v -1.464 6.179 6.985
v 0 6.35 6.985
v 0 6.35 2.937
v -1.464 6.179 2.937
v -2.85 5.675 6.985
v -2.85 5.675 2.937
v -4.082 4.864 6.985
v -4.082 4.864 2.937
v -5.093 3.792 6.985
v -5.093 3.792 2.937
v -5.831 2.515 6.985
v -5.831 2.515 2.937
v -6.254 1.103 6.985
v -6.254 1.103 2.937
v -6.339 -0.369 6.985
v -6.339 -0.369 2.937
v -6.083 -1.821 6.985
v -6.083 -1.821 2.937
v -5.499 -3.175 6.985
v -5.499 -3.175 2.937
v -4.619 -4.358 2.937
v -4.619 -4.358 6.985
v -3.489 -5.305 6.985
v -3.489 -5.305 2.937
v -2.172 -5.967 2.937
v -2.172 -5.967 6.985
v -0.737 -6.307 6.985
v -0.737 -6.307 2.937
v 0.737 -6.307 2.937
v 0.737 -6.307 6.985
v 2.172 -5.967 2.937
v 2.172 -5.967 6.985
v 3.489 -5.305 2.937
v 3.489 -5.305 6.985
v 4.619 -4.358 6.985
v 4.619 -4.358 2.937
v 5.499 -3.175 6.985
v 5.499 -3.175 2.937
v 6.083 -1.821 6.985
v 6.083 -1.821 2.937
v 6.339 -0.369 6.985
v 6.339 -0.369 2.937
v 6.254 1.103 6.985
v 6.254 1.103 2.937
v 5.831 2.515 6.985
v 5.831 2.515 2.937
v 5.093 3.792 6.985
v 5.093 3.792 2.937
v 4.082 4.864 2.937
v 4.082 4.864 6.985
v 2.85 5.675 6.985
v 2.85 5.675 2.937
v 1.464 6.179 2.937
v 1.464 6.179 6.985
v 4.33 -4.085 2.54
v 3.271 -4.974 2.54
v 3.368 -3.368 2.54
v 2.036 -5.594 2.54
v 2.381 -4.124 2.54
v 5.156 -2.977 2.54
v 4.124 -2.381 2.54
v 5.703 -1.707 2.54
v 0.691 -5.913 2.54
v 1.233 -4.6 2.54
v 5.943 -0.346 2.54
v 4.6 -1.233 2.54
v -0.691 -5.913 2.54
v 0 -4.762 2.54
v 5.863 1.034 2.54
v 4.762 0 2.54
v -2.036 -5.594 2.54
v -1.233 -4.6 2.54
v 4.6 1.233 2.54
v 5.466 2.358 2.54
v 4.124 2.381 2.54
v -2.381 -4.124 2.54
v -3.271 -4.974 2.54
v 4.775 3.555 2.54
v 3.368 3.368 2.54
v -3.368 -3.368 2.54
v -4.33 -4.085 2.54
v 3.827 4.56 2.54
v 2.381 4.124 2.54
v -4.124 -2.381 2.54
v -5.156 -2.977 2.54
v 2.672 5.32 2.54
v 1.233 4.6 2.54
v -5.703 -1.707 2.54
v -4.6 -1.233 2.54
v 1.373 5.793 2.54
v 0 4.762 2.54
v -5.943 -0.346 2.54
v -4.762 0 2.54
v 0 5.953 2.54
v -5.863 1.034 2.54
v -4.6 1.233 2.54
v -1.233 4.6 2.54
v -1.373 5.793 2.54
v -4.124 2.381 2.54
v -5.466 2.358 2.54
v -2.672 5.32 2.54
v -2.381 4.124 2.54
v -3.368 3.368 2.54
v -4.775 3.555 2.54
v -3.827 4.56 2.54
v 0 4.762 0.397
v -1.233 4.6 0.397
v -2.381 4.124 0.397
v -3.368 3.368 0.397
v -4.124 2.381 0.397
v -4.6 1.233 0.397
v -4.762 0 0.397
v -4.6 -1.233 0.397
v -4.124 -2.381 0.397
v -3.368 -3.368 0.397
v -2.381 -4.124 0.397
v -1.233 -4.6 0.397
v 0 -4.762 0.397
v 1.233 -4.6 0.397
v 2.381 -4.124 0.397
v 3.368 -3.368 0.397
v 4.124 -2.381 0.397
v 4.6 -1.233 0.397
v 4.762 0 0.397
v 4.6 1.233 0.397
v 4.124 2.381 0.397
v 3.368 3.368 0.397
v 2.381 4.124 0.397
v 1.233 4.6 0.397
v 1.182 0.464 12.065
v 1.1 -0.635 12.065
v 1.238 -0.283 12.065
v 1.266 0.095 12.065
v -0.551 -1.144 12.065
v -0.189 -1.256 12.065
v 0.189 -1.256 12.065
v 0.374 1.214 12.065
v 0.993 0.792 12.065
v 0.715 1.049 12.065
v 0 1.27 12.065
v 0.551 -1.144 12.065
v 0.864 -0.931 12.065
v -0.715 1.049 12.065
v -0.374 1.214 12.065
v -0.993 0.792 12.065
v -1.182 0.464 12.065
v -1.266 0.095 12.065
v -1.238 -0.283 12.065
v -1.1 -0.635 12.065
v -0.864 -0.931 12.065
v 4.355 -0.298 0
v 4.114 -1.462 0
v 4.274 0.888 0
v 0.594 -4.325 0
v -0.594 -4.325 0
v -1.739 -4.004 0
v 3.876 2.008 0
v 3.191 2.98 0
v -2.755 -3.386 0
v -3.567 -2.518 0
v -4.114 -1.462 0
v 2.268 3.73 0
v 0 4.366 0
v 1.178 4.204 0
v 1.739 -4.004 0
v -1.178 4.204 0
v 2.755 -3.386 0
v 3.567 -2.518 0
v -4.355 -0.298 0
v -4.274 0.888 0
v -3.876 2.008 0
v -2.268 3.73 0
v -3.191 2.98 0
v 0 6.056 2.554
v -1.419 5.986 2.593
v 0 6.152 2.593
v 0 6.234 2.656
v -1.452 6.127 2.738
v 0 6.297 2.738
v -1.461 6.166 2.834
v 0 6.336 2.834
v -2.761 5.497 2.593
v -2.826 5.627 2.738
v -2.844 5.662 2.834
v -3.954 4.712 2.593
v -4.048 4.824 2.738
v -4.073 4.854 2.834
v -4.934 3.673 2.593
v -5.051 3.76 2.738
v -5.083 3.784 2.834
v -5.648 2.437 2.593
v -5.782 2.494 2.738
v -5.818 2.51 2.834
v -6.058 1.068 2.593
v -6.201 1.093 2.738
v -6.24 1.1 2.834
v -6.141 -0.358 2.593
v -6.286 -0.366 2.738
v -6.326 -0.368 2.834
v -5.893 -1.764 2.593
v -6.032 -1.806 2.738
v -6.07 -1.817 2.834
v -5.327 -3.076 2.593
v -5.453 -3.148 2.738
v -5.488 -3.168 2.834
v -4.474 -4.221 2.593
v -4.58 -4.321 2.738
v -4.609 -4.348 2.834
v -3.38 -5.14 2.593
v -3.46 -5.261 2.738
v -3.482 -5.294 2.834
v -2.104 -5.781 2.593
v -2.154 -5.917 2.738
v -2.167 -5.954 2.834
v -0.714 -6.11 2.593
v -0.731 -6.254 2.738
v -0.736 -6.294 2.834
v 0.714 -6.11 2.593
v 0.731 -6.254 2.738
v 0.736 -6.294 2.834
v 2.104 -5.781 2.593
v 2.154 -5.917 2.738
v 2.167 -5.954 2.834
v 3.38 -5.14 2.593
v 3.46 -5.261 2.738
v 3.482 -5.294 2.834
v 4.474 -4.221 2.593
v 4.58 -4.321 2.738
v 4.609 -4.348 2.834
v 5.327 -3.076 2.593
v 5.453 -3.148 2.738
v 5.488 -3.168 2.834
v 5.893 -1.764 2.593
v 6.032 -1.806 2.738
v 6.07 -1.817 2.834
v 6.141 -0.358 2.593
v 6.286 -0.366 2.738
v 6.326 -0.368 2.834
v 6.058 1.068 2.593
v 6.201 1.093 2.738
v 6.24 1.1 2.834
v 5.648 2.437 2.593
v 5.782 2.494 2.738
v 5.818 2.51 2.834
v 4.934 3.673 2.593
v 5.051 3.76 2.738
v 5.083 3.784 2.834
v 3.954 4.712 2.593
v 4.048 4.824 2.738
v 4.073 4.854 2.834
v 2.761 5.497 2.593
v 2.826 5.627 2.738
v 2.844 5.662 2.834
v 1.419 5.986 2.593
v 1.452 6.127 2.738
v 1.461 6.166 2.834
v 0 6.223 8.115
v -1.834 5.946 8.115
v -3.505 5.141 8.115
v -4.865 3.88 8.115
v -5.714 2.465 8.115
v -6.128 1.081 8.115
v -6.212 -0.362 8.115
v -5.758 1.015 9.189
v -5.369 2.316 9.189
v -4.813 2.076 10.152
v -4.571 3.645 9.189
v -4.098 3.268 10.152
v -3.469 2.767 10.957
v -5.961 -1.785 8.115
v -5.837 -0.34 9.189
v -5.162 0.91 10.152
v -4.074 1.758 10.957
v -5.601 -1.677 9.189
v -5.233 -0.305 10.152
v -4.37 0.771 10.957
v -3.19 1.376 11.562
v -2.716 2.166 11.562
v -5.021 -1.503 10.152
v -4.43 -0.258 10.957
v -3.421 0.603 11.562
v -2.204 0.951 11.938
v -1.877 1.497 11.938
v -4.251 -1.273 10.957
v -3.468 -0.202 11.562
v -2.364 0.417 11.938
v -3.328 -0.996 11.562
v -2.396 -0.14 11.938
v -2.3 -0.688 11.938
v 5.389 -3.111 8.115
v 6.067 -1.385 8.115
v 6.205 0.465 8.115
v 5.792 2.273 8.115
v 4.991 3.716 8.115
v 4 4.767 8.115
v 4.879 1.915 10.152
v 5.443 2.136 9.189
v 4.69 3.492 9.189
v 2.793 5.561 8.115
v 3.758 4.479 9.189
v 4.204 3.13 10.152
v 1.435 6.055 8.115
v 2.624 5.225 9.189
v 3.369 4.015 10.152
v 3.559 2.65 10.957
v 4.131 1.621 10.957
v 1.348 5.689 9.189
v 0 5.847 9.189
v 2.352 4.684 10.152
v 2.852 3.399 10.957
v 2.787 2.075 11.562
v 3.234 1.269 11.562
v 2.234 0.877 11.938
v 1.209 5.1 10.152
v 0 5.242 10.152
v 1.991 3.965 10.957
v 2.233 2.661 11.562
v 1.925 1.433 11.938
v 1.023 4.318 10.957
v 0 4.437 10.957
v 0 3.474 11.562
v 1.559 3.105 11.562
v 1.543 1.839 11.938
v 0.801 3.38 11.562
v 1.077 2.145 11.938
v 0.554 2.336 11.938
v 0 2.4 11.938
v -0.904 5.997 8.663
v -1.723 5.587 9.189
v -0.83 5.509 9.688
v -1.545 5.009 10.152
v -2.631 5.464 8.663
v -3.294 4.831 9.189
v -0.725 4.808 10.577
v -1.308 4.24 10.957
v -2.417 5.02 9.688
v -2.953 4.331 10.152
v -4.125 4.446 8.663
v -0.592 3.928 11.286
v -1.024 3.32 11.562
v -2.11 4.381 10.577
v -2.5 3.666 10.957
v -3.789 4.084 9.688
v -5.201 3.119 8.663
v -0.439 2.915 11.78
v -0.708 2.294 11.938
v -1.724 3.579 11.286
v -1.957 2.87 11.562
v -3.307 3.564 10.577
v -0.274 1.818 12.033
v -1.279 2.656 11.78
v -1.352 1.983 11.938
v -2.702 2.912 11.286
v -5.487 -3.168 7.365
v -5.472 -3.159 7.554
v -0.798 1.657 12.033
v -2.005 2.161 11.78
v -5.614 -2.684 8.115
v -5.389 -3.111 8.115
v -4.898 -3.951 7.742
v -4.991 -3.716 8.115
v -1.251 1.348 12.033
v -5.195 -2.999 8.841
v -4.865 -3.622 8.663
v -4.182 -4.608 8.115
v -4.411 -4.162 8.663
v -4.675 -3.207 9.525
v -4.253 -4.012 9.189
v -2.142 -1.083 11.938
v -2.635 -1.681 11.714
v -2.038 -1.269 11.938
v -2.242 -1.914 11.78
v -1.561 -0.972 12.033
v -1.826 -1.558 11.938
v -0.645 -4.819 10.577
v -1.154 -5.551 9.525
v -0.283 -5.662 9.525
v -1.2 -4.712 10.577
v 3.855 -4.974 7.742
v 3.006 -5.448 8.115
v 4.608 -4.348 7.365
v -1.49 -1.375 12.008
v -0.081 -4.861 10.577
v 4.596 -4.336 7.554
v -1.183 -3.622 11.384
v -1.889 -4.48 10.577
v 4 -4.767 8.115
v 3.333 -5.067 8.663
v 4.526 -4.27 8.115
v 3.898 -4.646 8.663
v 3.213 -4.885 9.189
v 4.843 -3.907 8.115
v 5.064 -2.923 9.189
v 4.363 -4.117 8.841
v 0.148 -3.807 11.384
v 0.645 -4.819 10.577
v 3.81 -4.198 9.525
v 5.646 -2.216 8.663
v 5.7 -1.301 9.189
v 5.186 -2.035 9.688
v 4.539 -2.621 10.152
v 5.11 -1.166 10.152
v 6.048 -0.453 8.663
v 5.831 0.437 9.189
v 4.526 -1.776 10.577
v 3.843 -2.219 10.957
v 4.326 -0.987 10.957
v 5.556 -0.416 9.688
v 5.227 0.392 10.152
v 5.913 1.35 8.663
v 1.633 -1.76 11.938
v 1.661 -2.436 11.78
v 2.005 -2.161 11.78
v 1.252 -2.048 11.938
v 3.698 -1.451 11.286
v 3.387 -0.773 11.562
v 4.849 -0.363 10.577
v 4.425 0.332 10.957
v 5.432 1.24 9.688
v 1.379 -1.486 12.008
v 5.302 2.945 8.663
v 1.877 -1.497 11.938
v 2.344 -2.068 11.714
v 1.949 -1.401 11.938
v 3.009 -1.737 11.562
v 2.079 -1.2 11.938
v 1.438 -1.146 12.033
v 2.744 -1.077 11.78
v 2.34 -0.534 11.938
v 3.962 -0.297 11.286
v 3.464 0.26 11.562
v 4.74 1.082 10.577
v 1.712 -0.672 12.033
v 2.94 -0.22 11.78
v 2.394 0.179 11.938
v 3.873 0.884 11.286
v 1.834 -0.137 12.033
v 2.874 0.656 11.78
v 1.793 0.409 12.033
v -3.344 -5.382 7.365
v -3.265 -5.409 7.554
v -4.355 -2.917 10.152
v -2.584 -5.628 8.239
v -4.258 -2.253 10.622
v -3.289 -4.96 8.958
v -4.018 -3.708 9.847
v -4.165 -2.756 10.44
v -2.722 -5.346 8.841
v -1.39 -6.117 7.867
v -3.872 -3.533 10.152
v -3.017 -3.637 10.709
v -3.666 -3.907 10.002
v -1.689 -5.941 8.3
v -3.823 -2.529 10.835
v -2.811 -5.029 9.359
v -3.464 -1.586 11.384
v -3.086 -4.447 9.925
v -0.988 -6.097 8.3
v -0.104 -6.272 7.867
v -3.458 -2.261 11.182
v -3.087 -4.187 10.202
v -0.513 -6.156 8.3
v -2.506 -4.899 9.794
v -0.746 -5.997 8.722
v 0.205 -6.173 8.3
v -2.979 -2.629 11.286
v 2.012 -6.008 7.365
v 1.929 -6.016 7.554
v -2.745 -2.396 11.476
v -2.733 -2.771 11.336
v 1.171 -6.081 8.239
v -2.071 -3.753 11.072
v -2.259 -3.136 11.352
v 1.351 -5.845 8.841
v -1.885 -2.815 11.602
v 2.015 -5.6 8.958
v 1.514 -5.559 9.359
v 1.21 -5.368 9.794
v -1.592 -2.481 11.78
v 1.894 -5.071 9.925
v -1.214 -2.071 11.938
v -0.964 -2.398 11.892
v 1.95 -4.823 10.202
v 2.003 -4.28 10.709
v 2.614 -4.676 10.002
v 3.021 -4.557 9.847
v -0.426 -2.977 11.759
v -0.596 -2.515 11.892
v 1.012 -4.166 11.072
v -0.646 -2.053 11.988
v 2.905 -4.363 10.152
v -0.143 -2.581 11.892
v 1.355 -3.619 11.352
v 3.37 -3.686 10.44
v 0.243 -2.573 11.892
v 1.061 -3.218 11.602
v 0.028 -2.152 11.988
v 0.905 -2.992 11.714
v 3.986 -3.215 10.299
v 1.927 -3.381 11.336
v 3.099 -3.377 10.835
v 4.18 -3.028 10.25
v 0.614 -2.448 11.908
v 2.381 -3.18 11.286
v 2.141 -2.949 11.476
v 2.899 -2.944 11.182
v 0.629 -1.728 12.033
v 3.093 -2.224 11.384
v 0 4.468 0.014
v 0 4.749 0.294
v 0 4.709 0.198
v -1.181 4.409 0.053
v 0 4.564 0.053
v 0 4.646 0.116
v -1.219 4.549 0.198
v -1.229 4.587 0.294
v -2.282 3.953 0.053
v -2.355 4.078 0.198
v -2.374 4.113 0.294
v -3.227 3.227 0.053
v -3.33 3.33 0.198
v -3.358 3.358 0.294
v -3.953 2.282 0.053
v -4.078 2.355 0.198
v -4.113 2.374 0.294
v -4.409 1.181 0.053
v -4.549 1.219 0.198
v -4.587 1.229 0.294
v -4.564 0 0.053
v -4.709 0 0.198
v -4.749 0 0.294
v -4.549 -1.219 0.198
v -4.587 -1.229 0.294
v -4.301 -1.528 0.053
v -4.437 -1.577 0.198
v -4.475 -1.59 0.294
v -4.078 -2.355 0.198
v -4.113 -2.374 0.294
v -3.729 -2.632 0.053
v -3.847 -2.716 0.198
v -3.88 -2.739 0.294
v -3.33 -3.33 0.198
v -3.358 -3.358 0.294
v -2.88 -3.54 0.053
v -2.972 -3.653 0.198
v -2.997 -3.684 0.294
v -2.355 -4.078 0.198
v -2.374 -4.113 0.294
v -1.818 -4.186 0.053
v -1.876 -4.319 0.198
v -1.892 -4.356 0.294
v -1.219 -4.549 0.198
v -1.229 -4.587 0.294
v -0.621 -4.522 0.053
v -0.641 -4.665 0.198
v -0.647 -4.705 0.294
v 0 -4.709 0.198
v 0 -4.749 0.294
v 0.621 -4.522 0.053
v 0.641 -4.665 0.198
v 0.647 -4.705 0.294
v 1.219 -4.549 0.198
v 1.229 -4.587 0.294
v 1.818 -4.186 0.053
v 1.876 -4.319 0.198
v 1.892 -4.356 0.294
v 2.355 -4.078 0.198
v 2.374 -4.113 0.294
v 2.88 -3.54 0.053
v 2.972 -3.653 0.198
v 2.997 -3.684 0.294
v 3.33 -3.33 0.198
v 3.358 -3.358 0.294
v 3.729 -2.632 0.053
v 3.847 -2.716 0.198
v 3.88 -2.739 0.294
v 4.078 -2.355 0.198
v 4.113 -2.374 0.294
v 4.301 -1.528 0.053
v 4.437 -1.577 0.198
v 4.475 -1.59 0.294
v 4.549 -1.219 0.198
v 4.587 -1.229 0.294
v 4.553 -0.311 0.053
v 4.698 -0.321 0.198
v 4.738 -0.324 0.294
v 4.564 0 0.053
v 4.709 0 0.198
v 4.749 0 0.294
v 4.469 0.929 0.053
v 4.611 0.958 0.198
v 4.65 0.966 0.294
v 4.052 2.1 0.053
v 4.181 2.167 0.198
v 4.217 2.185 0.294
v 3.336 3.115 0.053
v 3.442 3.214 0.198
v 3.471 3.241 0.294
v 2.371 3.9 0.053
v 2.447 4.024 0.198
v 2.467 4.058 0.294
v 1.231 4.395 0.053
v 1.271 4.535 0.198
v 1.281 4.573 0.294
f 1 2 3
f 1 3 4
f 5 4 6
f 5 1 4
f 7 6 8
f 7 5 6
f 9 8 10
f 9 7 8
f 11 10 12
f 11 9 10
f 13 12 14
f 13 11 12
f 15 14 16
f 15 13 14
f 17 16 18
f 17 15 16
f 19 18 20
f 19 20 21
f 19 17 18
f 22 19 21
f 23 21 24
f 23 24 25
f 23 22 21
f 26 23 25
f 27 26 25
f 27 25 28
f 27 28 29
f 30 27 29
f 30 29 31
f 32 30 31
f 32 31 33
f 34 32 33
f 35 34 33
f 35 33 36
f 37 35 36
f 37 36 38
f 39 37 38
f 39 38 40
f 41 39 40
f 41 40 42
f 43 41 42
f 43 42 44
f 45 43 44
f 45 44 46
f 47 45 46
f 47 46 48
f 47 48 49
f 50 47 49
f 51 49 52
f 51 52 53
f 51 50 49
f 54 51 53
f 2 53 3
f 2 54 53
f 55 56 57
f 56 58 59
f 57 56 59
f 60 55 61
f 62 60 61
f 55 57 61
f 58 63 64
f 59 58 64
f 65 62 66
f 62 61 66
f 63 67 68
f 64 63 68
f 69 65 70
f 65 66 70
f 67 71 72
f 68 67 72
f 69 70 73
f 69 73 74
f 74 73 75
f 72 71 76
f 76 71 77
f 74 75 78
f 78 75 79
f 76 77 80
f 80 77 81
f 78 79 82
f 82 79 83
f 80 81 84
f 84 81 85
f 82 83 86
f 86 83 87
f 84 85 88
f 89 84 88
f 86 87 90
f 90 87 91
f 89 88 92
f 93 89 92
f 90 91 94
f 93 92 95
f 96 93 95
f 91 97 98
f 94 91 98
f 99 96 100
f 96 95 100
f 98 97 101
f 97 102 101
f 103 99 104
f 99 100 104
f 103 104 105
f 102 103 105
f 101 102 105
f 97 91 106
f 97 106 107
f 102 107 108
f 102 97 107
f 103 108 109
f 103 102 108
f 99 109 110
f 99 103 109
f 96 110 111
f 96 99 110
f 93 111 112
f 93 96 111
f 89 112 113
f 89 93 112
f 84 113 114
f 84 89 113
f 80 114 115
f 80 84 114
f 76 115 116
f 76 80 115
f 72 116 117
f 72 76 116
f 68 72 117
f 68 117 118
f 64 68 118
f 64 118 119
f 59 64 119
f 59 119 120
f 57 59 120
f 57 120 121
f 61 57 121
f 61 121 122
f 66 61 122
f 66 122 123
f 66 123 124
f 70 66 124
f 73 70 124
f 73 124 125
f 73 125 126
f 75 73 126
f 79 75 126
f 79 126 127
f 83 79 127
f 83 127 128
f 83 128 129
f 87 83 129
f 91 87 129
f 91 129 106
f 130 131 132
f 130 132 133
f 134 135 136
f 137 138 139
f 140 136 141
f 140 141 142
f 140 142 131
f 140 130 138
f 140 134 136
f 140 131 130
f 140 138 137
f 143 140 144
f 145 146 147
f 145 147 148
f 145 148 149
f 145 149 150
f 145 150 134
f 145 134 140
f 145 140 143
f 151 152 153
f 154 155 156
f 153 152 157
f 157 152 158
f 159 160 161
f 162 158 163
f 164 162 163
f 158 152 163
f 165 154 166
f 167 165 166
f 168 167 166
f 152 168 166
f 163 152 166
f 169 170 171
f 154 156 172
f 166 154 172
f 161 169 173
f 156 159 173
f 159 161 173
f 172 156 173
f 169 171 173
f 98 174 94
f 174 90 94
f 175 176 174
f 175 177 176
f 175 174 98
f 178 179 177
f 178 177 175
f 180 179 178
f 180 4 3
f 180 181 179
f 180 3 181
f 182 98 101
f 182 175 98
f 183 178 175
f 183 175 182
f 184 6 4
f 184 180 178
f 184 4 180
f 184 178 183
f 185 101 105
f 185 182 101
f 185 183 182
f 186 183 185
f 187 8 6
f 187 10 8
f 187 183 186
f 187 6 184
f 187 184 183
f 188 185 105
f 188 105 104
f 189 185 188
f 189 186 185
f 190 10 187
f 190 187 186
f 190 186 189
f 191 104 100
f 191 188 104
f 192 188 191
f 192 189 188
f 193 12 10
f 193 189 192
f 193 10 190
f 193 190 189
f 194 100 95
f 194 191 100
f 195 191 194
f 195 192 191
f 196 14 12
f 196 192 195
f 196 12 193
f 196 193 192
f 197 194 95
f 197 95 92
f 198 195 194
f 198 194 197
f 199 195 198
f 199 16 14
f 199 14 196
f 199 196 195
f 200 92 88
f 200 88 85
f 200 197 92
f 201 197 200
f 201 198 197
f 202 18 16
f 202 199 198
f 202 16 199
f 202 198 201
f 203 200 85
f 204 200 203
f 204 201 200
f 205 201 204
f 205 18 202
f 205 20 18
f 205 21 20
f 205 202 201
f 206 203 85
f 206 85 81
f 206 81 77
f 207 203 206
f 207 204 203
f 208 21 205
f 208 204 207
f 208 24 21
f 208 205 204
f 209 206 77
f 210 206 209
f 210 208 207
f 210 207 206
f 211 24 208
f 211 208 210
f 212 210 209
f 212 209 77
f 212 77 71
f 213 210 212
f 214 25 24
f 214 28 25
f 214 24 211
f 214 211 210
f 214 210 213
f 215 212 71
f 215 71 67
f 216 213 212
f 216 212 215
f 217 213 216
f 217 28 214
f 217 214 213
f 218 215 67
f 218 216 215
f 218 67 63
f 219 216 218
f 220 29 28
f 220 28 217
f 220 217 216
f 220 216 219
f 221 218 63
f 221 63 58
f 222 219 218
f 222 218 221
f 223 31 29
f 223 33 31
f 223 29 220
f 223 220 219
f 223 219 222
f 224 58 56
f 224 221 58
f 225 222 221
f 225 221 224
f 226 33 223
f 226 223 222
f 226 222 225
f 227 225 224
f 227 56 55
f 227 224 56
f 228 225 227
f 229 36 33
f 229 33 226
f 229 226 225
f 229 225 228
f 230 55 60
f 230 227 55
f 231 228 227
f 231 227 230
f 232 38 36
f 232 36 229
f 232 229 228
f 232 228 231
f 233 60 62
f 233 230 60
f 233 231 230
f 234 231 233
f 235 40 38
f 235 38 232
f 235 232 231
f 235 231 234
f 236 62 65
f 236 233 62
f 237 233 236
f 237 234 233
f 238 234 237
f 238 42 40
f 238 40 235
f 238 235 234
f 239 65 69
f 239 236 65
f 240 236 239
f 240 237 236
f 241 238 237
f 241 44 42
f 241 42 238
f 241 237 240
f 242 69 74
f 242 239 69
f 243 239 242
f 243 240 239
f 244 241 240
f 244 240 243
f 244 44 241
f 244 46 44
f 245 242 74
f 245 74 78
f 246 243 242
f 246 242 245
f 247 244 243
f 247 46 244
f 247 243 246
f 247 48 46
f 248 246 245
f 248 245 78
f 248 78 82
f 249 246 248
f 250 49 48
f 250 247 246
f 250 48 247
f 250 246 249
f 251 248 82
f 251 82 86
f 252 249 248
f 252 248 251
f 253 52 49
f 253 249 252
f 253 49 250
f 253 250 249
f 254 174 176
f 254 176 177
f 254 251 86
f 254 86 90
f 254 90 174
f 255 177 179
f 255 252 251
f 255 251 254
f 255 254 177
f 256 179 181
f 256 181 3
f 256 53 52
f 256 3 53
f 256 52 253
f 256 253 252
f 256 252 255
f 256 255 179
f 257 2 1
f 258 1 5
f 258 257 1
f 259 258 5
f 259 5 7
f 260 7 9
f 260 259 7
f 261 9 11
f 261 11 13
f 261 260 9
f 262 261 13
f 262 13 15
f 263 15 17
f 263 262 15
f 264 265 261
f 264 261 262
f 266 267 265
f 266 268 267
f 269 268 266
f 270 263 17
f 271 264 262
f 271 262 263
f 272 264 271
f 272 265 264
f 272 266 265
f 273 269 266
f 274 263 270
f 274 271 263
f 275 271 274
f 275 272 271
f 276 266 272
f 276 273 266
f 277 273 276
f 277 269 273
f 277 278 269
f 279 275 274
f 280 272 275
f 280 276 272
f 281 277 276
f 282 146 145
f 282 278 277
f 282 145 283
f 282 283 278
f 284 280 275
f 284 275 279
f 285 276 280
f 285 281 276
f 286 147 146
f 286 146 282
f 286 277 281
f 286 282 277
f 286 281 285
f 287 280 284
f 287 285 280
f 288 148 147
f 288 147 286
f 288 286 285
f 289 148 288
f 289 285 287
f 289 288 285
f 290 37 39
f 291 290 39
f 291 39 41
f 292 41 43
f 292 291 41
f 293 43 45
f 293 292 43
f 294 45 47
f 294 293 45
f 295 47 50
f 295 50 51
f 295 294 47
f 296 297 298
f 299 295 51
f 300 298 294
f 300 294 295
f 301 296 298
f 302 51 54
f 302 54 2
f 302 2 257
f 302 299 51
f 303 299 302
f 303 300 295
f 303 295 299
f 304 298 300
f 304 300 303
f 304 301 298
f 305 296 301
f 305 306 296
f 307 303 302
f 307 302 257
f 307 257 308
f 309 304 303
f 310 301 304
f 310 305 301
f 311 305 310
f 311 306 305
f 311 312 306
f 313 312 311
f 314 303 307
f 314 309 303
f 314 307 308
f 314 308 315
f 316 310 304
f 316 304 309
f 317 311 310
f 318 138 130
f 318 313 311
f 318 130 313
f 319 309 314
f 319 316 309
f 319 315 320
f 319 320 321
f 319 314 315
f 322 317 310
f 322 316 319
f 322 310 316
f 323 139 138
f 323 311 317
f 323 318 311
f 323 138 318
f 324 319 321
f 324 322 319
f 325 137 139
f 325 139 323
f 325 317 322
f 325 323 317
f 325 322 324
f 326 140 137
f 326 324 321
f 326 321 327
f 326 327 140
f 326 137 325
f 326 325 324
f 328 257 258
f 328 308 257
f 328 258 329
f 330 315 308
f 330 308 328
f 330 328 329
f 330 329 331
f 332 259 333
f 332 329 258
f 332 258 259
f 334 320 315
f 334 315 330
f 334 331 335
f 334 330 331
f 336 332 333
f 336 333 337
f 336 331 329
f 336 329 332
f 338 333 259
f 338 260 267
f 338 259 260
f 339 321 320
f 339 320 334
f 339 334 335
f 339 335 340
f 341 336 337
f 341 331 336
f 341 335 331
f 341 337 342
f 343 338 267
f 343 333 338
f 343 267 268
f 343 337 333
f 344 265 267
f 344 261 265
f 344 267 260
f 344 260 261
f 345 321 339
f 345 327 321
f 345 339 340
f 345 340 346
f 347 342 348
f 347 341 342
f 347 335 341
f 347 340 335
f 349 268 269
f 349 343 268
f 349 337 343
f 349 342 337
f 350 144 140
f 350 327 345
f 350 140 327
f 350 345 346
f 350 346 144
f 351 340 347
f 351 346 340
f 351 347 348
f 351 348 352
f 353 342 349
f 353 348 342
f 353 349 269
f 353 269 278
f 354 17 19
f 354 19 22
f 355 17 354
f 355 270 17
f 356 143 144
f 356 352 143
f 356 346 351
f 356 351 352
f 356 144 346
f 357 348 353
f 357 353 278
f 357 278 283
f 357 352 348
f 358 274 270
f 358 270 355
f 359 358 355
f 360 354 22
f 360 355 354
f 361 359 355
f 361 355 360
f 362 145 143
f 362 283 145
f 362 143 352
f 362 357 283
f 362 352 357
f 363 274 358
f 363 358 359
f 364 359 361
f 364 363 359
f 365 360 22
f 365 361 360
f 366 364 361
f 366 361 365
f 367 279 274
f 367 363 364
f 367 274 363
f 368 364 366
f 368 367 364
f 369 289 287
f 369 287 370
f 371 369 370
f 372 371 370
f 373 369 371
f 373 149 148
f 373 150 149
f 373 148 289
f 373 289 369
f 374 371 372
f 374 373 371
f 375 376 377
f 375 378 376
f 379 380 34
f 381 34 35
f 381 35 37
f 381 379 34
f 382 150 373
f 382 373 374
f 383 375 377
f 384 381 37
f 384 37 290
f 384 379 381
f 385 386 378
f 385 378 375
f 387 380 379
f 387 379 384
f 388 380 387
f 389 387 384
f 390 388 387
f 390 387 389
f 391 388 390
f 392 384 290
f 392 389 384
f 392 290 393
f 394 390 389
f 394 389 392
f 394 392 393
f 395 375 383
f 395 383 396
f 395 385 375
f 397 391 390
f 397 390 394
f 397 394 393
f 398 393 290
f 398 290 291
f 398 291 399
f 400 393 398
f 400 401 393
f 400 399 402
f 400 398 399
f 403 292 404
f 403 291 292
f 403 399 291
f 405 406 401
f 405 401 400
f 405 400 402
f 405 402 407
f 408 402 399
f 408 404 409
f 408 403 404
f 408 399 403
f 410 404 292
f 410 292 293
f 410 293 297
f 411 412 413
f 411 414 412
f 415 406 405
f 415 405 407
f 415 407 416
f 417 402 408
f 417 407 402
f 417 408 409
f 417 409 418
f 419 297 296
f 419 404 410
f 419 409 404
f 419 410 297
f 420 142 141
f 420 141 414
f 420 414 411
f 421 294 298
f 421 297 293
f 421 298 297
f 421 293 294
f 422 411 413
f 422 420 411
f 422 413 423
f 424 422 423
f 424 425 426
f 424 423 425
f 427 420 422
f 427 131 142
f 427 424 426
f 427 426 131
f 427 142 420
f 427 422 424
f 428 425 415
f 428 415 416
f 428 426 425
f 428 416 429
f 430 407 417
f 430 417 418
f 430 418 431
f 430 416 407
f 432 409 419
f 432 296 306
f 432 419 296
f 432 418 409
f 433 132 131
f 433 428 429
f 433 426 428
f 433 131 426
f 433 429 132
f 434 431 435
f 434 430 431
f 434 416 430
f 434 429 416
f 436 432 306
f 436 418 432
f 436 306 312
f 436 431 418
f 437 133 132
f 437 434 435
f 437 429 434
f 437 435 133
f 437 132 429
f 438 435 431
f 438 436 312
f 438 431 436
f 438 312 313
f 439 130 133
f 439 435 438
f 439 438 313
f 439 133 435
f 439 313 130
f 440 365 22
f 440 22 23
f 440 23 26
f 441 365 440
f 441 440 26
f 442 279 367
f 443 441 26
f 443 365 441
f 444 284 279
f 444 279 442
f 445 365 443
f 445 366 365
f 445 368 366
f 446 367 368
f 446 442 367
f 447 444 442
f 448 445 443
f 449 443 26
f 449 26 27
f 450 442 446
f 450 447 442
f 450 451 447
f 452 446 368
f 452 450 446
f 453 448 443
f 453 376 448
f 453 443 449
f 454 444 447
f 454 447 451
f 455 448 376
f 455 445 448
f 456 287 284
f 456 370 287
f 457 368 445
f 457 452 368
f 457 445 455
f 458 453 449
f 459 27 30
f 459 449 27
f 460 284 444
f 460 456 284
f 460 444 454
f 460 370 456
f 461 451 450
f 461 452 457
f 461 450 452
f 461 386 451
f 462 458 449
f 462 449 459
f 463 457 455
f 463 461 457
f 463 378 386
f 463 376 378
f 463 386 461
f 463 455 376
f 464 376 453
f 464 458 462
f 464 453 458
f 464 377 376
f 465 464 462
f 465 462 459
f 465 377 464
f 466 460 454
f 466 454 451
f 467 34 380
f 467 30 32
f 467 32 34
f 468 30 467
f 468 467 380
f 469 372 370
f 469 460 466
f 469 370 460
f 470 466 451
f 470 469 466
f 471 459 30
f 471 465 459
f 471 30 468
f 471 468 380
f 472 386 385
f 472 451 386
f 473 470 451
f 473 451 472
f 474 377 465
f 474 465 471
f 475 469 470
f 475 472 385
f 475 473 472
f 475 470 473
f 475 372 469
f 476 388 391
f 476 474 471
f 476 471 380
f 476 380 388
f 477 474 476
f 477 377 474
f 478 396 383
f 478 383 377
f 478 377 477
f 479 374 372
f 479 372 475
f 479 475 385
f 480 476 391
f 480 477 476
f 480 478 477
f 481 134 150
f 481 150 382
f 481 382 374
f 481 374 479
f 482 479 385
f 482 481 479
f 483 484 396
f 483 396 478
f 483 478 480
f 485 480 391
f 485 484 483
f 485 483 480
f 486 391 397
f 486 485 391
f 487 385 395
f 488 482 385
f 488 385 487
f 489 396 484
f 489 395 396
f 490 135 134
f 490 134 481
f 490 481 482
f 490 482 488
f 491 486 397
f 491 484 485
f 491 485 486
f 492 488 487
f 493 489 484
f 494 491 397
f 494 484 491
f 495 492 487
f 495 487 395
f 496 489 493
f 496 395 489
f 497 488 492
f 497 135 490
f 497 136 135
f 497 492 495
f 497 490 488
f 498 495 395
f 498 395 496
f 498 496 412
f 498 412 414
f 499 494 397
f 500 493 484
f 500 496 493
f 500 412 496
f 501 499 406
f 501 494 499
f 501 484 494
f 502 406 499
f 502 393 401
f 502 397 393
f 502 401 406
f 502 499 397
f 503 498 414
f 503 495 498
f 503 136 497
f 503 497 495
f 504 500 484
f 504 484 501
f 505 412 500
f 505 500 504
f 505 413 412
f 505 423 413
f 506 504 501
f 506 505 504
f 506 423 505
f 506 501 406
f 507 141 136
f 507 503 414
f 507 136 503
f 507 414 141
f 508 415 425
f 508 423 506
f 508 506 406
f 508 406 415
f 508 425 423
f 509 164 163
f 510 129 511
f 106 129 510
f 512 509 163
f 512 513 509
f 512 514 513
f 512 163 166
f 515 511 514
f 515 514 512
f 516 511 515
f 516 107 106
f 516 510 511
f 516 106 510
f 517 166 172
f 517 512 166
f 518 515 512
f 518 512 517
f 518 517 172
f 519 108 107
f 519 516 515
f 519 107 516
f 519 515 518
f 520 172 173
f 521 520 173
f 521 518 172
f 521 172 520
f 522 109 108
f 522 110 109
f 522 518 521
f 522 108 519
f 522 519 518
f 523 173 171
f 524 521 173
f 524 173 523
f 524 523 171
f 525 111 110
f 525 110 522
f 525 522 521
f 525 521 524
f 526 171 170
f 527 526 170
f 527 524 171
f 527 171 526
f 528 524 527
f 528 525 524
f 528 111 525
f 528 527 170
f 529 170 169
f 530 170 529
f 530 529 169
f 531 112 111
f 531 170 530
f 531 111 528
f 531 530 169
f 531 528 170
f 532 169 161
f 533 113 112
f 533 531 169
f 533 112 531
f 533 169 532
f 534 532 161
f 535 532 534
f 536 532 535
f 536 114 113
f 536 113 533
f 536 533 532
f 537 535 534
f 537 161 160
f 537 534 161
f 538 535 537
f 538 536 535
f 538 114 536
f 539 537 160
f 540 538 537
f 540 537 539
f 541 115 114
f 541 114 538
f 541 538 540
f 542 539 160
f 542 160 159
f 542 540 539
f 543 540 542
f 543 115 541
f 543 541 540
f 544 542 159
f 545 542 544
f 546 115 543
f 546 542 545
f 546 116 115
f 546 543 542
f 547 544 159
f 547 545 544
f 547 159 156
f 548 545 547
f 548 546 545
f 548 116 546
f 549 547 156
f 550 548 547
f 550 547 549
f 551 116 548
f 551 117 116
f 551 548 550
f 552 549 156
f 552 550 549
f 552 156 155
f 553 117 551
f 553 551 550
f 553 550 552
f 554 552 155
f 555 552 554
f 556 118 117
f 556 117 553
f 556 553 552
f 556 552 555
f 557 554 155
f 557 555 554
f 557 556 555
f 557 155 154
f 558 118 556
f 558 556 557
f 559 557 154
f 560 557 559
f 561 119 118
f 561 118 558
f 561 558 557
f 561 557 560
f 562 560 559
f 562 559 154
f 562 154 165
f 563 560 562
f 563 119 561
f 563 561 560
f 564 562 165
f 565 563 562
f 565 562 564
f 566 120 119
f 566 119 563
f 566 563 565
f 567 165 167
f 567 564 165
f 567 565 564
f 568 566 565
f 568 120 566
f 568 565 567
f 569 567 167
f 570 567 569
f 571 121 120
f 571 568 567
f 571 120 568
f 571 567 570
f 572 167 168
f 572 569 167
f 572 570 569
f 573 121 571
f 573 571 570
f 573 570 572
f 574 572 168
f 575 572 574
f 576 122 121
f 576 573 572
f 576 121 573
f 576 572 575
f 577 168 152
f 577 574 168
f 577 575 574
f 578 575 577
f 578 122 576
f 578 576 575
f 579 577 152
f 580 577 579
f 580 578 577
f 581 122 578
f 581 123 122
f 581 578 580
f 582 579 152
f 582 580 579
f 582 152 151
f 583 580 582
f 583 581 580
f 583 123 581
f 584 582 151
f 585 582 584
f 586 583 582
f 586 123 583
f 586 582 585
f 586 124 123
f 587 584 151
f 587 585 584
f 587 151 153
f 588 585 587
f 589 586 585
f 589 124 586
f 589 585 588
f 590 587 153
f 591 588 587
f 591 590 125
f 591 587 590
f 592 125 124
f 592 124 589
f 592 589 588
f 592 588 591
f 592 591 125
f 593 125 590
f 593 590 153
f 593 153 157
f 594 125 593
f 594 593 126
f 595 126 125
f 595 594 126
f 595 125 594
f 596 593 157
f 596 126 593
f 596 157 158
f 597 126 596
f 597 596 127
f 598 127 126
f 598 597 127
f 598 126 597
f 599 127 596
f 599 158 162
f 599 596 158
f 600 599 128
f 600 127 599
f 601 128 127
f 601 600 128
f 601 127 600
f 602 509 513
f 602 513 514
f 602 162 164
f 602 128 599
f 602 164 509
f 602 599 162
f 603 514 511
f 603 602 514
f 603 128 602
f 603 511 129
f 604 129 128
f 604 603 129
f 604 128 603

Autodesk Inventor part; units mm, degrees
ref_plane "YZ Plane" through (0, 0, 0) normal (1, 0, 0) x (0, 1, 0)
ref_plane "XZ Plane" through (0, 0, 0) normal (0, 1, 0) x (-1, 0, 0)
ref_plane "XY Plane" through (0, 0, 0) normal (0, 0, 1) x (1, 0, 0)
sketch "Sketch1" plane through (0, 0, 0) normal (1, 0, 0) x (0, 1, 0)
  line L0 (0, 0) -> (0, 9.586) construction
  line L1 (0, 0) -> (4.3656, 0)
  line L2 (4.7625, 0.3969) -> (4.7625, 2.54)
  line L3 (4.7625, 2.54) -> (0, 2.54)
  line L4 (0, 2.54) -> (0, 0)
  line L5 (0, 2.54) -> (5.9531, 2.54)
  line L6 (6.35, 2.9369) -> (6.35, 6.985)
  line L7 (1.27, 12.065) -> (0, 12.065)
  line L8 (0, 12.065) -> (0, 2.54)
  arc A0 (4.3656, 0) -> (4.7625, 0.3969) centre (4.3656, 0.3969) ccw
  arc A1 (5.9531, 2.54) -> (6.35, 2.9369) centre (5.9531, 2.9369) ccw
  arc A2 (6.35, 6.985) -> (1.27, 12.065) centre (1.27, 6.985) ccw
  point P0 (4.7625, 0)
  point P1 (6.35, 12.065)
  point P2 (6.35, 2.54)
  point P3 (5.9531, 12.065)
  point P4 (6.35, 11.6681)
  dimension "d0" = 2.54
  dimension "d4" = 9.525
  dimension "d5" = 6.35
  dimension "d6" = 0.3969
  dimension "d7" = 0.3969
  dimension "d11" = 4.7625
  dimension "d14" = 5.08
revolve "Revolution1" add sketch "Sketch1" angle 360 about axis through (0, 0, 0) along (0, 0, 1)
properties part number "BottomStands"
